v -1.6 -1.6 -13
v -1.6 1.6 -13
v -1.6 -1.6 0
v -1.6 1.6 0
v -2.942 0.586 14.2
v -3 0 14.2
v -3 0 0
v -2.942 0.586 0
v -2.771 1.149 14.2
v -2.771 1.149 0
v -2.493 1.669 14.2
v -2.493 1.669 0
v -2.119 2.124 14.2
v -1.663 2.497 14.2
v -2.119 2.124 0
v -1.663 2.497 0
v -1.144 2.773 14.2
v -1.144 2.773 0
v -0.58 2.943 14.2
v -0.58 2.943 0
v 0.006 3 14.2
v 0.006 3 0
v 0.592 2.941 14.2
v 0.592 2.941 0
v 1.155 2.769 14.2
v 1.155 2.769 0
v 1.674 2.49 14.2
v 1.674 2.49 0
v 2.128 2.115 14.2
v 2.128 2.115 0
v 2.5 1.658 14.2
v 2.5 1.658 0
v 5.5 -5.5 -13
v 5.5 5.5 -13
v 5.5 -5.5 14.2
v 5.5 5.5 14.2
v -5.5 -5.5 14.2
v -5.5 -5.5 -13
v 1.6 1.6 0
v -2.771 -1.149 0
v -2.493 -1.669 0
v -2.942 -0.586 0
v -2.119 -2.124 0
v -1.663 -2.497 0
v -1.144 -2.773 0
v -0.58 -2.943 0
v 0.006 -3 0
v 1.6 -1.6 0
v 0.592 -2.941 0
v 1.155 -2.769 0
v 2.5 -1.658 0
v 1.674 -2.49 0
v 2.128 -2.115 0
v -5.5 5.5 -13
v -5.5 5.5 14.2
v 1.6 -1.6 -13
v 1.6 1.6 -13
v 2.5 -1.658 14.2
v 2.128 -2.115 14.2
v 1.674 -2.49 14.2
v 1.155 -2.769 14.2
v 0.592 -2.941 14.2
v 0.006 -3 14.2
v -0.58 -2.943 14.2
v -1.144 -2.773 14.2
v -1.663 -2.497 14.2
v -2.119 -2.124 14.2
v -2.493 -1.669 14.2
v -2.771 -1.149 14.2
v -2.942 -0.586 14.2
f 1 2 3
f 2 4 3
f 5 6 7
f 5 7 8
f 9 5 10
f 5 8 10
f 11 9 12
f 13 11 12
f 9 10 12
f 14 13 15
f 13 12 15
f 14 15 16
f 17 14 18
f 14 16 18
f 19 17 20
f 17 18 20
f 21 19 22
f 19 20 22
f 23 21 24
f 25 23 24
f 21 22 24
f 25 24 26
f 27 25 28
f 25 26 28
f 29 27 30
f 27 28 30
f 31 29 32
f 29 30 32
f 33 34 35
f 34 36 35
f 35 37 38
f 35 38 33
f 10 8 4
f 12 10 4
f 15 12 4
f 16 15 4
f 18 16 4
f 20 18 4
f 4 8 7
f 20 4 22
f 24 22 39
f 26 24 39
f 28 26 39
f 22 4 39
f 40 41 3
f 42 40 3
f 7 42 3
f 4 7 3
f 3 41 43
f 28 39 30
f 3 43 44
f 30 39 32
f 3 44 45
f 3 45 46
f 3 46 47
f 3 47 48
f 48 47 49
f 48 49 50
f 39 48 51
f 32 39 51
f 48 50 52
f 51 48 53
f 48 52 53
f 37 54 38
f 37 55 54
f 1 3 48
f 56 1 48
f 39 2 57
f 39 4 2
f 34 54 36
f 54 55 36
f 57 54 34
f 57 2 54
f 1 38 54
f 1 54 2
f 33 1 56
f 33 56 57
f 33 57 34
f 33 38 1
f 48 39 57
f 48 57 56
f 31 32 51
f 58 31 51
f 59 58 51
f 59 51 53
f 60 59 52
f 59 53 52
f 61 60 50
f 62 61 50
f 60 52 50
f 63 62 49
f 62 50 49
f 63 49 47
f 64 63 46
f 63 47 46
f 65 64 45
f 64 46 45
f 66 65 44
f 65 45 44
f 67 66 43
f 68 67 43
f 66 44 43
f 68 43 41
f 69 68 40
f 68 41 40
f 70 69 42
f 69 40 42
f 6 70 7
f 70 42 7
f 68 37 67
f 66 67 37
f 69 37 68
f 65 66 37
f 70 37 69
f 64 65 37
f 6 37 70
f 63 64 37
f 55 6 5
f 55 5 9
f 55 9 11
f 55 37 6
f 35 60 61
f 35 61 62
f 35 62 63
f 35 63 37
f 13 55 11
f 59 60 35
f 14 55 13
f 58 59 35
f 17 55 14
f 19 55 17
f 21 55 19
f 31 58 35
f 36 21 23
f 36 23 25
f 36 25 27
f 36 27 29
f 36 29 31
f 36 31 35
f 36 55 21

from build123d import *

# Parameters (mm, degrees)
F0_W     = 11
F0_H     = 11
F1_DEPTH = 14.2
F2_W     = 11
F2_H     = 11
F3_DEPTH = 3
F4_W     = 11
F4_H     = 11
F4_W_2   = 3.2
F4_H_2   = 3.2
F5_DEPTH = 10
F6_DEPTH = 25


# Not quite as in the source:
# - a feature names something its author has since deleted; it is built from what else it names


with BuildPart() as f1:
    # F0 (on Top) → F1 (new body)
    with BuildSketch(Plane.XY):
        Rectangle(F0_W, F0_H)
        with BuildLine():
            ThreePointArc((2.5, 1.6583123952), (2.8722813233, 0.8660254038), (3, 0))
            ThreePointArc((3, 0), (2.8722813233, -0.8660254038), (2.5, -1.6583123952))
            ThreePointArc((2.5, -1.6583123952), (-0.8660254038, -2.8722813233), (-3, 0))
            ThreePointArc((-3, 0), (-0.8660254038, 2.8722813233), (2.5, 1.6583123952))
        make_face(mode=Mode.SUBTRACT)
        with BuildLine():
            ThreePointArc((2.5, -1.6583123952), (2.8722813233, -0.8660254038), (3, 0))
            ThreePointArc((3, 0), (2.8722813233, 0.8660254038), (2.5, 1.6583123952))
            Line((2.5, 1.6583123952), (2.5, 0))
            Line((2.5, 0), (2.5, -1.6583123952))
        make_face()
    extrude(amount=F1_DEPTH)

    # F2 (on face) → F3 (join)
    with BuildSketch(Plane(origin=(0, 0, 0), x_dir=(1, 0, 0), z_dir=(0, 0, -1))):
        Rectangle(F2_W, F2_H)
        with BuildLine():
            ThreePointArc((2.5, -1.6583123952), (-3, 0), (2.5, 1.6583123952))
            Line((2.5, 1.6583123952), (2.5, -1.6583123952))
        make_face(mode=Mode.SUBTRACT)
        with BuildLine():
            Line((2.5, -1.6583123952), (2.5, 1.6583123952))
            ThreePointArc((2.5, 1.6583123952), (-3, 0), (2.5, -1.6583123952))
        make_face()
    extrude(amount=F3_DEPTH)

    # F4 (on face) → F5 (join)
    with BuildSketch(Plane(origin=(0, 0, -3), x_dir=(1, 0, 0), z_dir=(0, 0, -1))):
        Rectangle(F4_W, F4_H)
        Rectangle(F4_W_2, F4_H_2, mode=Mode.SUBTRACT)
    extrude(amount=F5_DEPTH)

    # F6 (cut): a face of the model
    f6_faces = [f1.faces().sort_by_distance(p)[0] for p in [
        (0, 0, -3),
    ]]
    extrude(f6_faces, amount=-F6_DEPTH, mode=Mode.SUBTRACT)


solid = f1.part
